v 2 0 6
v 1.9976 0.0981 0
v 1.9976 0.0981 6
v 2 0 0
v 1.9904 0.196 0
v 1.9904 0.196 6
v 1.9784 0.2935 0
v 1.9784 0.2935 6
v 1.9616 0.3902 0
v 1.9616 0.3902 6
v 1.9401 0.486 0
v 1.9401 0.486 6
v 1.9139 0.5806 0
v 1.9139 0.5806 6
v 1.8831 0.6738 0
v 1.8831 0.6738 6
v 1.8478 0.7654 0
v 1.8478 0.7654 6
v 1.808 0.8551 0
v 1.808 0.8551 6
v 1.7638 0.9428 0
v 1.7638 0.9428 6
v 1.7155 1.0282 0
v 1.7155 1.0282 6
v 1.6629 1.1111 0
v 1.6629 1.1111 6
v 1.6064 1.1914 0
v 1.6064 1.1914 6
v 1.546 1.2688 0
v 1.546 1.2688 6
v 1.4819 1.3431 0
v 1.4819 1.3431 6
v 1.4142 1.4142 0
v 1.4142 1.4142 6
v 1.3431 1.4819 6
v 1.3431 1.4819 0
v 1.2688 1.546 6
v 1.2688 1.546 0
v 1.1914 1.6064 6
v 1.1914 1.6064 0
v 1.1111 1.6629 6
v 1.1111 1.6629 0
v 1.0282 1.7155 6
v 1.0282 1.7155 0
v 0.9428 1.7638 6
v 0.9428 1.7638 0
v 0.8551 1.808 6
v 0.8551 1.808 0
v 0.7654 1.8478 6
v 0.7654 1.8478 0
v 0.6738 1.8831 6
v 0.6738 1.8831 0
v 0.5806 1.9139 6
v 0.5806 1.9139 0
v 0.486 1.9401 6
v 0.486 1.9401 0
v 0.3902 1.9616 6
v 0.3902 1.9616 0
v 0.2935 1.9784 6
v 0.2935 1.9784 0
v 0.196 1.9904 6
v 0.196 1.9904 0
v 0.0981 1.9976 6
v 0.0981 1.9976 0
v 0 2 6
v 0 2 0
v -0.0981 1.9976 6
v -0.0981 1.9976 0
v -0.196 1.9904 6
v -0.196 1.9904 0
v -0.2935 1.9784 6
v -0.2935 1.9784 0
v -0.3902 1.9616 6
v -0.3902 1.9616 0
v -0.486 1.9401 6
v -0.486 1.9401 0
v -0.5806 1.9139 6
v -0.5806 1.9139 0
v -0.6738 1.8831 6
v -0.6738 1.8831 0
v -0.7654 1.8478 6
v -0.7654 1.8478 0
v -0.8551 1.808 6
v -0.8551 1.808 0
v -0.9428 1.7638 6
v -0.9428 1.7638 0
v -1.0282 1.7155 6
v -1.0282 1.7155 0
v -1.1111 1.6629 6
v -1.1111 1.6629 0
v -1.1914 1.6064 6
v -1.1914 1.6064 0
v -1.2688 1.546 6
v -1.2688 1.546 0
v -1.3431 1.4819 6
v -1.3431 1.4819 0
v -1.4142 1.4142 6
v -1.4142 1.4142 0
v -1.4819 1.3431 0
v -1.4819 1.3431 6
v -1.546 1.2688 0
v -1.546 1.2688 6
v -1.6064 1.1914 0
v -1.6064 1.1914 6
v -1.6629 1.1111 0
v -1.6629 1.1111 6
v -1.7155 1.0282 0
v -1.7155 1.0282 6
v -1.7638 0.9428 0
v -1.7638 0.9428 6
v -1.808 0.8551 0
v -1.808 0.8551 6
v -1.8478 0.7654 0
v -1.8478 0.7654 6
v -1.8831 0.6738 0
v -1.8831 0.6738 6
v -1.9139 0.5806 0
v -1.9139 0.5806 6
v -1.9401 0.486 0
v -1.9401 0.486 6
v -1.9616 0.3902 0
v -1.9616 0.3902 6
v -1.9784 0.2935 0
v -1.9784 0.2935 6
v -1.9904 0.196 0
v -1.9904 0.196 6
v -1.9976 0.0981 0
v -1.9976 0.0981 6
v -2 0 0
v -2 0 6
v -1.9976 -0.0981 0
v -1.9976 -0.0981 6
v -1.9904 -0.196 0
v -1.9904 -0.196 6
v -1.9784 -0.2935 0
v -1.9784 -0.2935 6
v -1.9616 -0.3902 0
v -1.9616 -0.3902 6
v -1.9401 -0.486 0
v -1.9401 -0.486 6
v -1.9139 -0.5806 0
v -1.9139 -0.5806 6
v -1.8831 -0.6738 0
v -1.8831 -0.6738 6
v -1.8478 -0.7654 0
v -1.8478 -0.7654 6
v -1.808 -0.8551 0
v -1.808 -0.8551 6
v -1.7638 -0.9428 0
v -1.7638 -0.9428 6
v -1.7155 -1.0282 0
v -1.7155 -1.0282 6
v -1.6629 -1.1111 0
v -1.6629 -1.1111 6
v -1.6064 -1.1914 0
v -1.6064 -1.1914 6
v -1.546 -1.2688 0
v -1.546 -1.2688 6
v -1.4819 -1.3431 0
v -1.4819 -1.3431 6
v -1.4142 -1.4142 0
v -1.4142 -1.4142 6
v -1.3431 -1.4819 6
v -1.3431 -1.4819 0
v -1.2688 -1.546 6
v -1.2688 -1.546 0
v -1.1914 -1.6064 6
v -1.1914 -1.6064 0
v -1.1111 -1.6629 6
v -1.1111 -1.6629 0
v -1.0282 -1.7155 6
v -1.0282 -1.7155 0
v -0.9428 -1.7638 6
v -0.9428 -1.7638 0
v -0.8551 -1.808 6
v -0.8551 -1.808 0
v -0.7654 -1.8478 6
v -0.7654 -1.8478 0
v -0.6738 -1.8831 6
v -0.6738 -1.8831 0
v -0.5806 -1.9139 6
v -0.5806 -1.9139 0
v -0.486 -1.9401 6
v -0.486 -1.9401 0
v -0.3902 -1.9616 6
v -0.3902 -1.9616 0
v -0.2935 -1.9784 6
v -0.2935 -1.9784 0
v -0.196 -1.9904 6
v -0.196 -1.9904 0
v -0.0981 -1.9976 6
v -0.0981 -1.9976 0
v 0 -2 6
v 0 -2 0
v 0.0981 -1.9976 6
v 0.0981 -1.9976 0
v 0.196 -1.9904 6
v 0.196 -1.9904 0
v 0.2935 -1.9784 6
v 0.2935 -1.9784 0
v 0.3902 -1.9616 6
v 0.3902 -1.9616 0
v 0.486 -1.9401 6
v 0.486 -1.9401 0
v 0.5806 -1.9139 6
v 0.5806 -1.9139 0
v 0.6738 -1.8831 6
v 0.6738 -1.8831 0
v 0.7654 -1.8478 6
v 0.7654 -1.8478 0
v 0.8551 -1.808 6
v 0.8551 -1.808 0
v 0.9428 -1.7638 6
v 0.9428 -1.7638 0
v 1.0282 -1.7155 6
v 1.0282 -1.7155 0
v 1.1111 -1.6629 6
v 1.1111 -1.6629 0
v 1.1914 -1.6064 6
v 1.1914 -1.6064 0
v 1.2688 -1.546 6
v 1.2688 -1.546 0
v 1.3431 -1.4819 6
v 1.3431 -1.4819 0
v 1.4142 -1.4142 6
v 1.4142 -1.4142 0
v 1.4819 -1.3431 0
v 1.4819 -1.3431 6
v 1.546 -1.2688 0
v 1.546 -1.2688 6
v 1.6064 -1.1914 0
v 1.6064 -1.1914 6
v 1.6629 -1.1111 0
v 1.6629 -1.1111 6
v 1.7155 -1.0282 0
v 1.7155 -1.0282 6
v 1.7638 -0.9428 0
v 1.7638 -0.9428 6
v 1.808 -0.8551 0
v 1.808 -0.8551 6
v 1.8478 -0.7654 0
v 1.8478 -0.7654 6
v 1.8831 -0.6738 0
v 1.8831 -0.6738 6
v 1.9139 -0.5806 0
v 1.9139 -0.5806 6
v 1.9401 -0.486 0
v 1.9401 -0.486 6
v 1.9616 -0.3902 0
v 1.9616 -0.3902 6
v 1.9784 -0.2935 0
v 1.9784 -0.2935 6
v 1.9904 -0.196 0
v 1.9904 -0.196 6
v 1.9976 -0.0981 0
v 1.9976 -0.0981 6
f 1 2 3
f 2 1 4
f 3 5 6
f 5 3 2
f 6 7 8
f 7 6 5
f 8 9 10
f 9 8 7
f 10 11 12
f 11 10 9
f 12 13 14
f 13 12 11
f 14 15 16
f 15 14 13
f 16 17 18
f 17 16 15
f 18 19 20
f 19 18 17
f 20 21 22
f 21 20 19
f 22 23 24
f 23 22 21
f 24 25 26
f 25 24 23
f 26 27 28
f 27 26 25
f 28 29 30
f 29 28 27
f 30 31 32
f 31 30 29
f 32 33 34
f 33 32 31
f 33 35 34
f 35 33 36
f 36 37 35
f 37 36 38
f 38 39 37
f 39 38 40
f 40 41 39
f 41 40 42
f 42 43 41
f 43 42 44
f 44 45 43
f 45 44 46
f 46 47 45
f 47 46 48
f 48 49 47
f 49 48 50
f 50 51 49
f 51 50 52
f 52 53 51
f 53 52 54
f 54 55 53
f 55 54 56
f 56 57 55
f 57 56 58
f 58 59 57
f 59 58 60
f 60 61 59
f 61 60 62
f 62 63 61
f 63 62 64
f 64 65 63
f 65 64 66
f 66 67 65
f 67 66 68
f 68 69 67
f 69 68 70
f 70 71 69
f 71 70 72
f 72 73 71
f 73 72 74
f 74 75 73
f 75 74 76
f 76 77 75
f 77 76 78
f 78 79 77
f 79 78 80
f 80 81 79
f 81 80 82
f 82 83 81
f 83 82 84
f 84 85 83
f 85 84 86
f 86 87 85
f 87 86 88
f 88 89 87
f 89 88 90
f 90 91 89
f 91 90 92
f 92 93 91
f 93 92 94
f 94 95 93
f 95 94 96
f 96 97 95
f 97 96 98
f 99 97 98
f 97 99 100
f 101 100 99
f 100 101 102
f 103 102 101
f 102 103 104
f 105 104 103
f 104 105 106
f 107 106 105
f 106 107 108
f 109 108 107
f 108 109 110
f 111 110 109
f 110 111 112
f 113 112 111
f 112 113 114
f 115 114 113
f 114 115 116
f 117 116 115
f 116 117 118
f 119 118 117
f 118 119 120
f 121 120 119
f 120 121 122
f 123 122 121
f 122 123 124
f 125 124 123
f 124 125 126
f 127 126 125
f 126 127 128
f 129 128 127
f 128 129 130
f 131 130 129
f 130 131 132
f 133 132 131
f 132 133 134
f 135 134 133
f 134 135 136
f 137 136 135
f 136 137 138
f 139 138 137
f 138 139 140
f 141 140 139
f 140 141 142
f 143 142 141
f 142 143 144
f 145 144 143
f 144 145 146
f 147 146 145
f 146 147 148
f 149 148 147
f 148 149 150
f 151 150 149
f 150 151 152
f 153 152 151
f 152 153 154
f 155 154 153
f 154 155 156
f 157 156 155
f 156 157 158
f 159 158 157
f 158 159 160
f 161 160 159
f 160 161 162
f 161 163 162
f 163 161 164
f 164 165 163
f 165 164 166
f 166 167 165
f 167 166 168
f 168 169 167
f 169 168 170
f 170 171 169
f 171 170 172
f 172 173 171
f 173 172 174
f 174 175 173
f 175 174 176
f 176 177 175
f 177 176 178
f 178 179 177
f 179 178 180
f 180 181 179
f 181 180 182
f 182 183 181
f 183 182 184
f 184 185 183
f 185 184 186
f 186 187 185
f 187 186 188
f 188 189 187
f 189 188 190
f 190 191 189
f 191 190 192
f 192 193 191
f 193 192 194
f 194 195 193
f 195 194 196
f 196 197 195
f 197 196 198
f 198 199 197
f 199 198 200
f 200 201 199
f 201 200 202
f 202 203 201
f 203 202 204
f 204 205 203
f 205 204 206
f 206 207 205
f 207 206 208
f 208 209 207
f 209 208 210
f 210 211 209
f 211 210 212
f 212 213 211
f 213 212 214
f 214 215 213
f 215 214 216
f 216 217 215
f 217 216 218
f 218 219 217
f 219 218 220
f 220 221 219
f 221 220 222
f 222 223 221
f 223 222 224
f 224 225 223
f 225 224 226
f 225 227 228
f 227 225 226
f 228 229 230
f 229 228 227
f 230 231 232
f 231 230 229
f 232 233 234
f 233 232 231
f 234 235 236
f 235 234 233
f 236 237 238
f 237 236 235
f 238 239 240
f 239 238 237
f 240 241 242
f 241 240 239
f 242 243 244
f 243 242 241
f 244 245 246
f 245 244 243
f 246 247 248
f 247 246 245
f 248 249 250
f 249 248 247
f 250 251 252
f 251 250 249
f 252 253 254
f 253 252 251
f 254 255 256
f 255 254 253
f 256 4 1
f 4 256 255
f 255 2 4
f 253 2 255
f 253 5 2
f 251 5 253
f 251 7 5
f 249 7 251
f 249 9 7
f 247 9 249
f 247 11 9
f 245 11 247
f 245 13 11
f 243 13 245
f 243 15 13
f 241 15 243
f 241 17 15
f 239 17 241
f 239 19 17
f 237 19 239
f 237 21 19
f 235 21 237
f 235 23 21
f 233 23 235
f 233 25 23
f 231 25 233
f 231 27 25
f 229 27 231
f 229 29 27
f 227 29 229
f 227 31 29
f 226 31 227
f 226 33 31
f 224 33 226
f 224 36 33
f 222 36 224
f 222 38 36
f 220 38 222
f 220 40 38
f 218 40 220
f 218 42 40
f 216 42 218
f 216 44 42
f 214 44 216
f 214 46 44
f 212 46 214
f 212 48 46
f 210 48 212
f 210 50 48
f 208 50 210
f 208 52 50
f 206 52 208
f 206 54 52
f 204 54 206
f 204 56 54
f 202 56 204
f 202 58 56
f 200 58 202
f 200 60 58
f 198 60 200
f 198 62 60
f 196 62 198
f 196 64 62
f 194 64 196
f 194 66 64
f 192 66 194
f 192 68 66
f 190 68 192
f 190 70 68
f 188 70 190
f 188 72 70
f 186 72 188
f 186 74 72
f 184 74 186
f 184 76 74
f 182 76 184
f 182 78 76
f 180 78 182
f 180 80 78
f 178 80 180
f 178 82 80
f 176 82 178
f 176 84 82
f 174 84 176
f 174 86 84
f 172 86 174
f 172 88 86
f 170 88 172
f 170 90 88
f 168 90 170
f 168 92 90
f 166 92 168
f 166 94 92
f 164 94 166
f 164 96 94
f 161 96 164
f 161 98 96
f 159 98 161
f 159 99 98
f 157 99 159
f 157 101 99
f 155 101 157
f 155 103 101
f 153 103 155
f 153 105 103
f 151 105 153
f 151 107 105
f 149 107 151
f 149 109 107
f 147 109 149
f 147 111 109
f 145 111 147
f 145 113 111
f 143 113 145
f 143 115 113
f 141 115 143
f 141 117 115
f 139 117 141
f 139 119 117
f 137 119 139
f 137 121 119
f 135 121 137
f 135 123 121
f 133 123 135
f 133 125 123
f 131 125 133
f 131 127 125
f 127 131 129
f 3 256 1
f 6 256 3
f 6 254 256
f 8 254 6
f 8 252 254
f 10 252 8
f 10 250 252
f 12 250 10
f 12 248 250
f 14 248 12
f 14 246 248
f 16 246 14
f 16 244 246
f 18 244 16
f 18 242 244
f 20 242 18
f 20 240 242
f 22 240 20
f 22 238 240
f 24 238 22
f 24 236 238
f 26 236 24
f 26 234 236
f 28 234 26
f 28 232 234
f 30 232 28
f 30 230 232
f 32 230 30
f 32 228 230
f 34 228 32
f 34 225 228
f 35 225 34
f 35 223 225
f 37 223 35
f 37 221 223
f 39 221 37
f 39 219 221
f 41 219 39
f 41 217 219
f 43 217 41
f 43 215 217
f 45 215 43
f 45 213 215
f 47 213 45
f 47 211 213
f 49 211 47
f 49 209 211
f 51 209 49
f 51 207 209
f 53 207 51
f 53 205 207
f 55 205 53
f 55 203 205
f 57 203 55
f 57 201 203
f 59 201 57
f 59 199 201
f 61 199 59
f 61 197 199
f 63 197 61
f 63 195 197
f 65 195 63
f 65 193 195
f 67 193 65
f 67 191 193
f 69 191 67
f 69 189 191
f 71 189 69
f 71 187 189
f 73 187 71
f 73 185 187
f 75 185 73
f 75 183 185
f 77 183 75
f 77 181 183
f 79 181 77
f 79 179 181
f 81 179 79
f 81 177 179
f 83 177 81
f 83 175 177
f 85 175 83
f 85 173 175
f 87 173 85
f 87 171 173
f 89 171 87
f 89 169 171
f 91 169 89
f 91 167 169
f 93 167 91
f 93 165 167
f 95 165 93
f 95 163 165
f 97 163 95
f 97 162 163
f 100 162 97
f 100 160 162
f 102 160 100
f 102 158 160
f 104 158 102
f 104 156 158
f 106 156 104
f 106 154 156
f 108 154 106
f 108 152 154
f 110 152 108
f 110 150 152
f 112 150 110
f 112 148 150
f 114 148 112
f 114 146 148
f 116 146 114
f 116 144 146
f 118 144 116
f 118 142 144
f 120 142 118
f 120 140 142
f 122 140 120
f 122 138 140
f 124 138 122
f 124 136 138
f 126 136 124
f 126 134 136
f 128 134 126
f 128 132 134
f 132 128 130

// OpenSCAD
$fn = 128;

module radial(params=[2.0, 0, 6]) {
    r = params[0];
    a = params[1];
    h = params[2];

    rotate([0,0,a])
        cylinder(h=h, r=r, center=false);
}

radial([2.0, 0, 6]);
